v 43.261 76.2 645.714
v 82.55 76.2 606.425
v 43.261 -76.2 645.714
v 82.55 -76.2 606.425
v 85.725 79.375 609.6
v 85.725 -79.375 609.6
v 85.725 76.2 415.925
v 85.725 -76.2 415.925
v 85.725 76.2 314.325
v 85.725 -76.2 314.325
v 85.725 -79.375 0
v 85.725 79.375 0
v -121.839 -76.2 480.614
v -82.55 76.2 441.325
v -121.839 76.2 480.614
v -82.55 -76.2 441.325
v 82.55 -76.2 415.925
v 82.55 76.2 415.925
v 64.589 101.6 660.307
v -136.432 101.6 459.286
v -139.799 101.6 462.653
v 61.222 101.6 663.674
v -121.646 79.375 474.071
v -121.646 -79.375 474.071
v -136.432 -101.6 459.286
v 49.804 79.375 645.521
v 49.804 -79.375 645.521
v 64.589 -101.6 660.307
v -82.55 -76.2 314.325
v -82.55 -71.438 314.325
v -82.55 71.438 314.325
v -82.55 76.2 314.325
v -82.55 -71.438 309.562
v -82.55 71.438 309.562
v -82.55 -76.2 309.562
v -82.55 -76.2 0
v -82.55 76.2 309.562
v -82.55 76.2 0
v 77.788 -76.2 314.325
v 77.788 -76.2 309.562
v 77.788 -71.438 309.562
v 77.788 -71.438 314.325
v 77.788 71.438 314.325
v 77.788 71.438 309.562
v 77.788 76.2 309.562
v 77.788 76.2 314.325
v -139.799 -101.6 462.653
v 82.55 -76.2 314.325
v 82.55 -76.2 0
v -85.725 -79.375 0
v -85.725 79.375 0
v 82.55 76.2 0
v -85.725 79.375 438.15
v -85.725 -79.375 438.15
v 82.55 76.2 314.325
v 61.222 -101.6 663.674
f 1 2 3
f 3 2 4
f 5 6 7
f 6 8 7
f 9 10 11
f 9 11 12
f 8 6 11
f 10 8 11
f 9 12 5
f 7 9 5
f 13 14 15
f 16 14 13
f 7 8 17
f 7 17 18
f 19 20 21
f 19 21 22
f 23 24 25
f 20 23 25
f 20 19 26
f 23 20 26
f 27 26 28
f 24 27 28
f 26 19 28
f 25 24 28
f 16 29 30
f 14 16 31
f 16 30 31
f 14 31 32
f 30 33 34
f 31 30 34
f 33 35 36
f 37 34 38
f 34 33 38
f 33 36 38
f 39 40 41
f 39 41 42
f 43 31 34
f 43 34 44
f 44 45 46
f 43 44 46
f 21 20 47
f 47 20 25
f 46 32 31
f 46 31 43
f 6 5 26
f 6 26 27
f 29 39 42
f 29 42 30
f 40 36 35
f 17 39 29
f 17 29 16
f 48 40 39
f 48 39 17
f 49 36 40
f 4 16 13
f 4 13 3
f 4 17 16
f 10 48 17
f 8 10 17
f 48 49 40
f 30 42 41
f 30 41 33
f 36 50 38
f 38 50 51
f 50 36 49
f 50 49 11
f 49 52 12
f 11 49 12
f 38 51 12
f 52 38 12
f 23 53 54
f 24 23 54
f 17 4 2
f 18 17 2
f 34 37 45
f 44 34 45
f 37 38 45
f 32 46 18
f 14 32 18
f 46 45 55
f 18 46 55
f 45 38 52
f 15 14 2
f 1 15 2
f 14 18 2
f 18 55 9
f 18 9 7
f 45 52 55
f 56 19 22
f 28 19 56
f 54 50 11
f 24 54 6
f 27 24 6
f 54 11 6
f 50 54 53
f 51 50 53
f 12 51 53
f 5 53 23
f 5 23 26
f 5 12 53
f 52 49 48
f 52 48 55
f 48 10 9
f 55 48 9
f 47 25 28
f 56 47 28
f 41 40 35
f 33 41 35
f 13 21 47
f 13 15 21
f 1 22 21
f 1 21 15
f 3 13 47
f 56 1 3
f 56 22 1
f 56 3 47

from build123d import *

# Parameters (mm, degrees)
F0_W      = 171.45
F0_H      = 158.75
F0_W_2    = 165.1
F0_H_2    = 152.4
F1_DEPTH  = 609.6
F3_DEPTH  = 158.751
F4_W      = 203.2
F4_H      = 284.28666
F4_W_2    = 152.4
F4_H_2    = 233.48666
F5_DEPTH  = 55.5625
F6_W      = 152.4
F6_H      = 101.6
F7_DEPTH  = 25.4
F8_W      = 160.3375
F8_H      = 4.7625
F9_DEPTH  = 4.7625
F10_W     = 160.3375
F10_H     = 4.7625
F11_DEPTH = 4.7625
F12_W     = 158.75
F12_H     = 242.466916
F13_DEPTH = 50.8


with BuildPart() as f1:
    # F0 (on Top) → F1 (new body)
    with BuildSketch(Plane.XY):
        Rectangle(F0_W, F0_H)
        Rectangle(F0_W_2, F0_H_2, mode=Mode.SUBTRACT)
    extrude(amount=F1_DEPTH)

    # F2 (on face) → F3 (cut, through all)
    with BuildSketch(Plane.XZ.offset(79.375)):
        Polygon((-85.725, 438.15), (85.725, 609.6), (-85.725, 609.6), align=None)
    extrude(amount=-F3_DEPTH, mode=Mode.SUBTRACT)

    # F4 (on face) → F5 (join)
    with BuildSketch(Plane(origin=(-261.9375, 0, 261.9375), x_dir=(0, -1, 0), z_dir=(-0.707107, 0, 0.707107))):
        with Locations((0, 370.435565)):
            Rectangle(F4_W, F4_H)
        with Locations((0, 370.435565)):
            Rectangle(F4_W_2, F4_H_2, mode=Mode.SUBTRACT)
    extrude(amount=F5_DEPTH)

    # F6 (on face) → F7 (cut)
    with BuildSketch(Plane.YZ.offset(85.725)):
        with Locations((0, 365.125)):
            Rectangle(F6_W, F6_H)
    extrude(amount=-F7_DEPTH, mode=Mode.SUBTRACT)

    # F8 (on face) → F9 (join)
    with BuildSketch(Plane(origin=(0, -76.2, 0), x_dir=(-1, 0, 0), z_dir=(0, 1, 0))):
        with Locations((2.38125, 311.94375)):
            Rectangle(F8_W, F8_H)
    extrude(amount=F9_DEPTH)

    # F10 (on face) → F11 (join)
    with BuildSketch(Plane.XZ.offset(-76.2)):
        with Locations((-2.38125, 311.94375)):
            Rectangle(F10_W, F10_H)
    extrude(amount=F11_DEPTH)

    # F12 (on face) → F13 (cut)
    with BuildSketch(Plane(origin=(-261.9375, 0, 261.9375), x_dir=(0, -1, 0), z_dir=(-0.707107, 0, 0.707107))):
        Polygon((101.6, 512.578895), (-101.6, 512.578895), (-101.6, 228.292235), (-79.375, 228.292235), (101.6, 228.292235), align=None)
        with Locations((0, 370.435565)):
            Rectangle(F12_W, F12_H, mode=Mode.SUBTRACT)
    extrude(amount=F13_DEPTH, mode=Mode.SUBTRACT)


solid = f1.part
